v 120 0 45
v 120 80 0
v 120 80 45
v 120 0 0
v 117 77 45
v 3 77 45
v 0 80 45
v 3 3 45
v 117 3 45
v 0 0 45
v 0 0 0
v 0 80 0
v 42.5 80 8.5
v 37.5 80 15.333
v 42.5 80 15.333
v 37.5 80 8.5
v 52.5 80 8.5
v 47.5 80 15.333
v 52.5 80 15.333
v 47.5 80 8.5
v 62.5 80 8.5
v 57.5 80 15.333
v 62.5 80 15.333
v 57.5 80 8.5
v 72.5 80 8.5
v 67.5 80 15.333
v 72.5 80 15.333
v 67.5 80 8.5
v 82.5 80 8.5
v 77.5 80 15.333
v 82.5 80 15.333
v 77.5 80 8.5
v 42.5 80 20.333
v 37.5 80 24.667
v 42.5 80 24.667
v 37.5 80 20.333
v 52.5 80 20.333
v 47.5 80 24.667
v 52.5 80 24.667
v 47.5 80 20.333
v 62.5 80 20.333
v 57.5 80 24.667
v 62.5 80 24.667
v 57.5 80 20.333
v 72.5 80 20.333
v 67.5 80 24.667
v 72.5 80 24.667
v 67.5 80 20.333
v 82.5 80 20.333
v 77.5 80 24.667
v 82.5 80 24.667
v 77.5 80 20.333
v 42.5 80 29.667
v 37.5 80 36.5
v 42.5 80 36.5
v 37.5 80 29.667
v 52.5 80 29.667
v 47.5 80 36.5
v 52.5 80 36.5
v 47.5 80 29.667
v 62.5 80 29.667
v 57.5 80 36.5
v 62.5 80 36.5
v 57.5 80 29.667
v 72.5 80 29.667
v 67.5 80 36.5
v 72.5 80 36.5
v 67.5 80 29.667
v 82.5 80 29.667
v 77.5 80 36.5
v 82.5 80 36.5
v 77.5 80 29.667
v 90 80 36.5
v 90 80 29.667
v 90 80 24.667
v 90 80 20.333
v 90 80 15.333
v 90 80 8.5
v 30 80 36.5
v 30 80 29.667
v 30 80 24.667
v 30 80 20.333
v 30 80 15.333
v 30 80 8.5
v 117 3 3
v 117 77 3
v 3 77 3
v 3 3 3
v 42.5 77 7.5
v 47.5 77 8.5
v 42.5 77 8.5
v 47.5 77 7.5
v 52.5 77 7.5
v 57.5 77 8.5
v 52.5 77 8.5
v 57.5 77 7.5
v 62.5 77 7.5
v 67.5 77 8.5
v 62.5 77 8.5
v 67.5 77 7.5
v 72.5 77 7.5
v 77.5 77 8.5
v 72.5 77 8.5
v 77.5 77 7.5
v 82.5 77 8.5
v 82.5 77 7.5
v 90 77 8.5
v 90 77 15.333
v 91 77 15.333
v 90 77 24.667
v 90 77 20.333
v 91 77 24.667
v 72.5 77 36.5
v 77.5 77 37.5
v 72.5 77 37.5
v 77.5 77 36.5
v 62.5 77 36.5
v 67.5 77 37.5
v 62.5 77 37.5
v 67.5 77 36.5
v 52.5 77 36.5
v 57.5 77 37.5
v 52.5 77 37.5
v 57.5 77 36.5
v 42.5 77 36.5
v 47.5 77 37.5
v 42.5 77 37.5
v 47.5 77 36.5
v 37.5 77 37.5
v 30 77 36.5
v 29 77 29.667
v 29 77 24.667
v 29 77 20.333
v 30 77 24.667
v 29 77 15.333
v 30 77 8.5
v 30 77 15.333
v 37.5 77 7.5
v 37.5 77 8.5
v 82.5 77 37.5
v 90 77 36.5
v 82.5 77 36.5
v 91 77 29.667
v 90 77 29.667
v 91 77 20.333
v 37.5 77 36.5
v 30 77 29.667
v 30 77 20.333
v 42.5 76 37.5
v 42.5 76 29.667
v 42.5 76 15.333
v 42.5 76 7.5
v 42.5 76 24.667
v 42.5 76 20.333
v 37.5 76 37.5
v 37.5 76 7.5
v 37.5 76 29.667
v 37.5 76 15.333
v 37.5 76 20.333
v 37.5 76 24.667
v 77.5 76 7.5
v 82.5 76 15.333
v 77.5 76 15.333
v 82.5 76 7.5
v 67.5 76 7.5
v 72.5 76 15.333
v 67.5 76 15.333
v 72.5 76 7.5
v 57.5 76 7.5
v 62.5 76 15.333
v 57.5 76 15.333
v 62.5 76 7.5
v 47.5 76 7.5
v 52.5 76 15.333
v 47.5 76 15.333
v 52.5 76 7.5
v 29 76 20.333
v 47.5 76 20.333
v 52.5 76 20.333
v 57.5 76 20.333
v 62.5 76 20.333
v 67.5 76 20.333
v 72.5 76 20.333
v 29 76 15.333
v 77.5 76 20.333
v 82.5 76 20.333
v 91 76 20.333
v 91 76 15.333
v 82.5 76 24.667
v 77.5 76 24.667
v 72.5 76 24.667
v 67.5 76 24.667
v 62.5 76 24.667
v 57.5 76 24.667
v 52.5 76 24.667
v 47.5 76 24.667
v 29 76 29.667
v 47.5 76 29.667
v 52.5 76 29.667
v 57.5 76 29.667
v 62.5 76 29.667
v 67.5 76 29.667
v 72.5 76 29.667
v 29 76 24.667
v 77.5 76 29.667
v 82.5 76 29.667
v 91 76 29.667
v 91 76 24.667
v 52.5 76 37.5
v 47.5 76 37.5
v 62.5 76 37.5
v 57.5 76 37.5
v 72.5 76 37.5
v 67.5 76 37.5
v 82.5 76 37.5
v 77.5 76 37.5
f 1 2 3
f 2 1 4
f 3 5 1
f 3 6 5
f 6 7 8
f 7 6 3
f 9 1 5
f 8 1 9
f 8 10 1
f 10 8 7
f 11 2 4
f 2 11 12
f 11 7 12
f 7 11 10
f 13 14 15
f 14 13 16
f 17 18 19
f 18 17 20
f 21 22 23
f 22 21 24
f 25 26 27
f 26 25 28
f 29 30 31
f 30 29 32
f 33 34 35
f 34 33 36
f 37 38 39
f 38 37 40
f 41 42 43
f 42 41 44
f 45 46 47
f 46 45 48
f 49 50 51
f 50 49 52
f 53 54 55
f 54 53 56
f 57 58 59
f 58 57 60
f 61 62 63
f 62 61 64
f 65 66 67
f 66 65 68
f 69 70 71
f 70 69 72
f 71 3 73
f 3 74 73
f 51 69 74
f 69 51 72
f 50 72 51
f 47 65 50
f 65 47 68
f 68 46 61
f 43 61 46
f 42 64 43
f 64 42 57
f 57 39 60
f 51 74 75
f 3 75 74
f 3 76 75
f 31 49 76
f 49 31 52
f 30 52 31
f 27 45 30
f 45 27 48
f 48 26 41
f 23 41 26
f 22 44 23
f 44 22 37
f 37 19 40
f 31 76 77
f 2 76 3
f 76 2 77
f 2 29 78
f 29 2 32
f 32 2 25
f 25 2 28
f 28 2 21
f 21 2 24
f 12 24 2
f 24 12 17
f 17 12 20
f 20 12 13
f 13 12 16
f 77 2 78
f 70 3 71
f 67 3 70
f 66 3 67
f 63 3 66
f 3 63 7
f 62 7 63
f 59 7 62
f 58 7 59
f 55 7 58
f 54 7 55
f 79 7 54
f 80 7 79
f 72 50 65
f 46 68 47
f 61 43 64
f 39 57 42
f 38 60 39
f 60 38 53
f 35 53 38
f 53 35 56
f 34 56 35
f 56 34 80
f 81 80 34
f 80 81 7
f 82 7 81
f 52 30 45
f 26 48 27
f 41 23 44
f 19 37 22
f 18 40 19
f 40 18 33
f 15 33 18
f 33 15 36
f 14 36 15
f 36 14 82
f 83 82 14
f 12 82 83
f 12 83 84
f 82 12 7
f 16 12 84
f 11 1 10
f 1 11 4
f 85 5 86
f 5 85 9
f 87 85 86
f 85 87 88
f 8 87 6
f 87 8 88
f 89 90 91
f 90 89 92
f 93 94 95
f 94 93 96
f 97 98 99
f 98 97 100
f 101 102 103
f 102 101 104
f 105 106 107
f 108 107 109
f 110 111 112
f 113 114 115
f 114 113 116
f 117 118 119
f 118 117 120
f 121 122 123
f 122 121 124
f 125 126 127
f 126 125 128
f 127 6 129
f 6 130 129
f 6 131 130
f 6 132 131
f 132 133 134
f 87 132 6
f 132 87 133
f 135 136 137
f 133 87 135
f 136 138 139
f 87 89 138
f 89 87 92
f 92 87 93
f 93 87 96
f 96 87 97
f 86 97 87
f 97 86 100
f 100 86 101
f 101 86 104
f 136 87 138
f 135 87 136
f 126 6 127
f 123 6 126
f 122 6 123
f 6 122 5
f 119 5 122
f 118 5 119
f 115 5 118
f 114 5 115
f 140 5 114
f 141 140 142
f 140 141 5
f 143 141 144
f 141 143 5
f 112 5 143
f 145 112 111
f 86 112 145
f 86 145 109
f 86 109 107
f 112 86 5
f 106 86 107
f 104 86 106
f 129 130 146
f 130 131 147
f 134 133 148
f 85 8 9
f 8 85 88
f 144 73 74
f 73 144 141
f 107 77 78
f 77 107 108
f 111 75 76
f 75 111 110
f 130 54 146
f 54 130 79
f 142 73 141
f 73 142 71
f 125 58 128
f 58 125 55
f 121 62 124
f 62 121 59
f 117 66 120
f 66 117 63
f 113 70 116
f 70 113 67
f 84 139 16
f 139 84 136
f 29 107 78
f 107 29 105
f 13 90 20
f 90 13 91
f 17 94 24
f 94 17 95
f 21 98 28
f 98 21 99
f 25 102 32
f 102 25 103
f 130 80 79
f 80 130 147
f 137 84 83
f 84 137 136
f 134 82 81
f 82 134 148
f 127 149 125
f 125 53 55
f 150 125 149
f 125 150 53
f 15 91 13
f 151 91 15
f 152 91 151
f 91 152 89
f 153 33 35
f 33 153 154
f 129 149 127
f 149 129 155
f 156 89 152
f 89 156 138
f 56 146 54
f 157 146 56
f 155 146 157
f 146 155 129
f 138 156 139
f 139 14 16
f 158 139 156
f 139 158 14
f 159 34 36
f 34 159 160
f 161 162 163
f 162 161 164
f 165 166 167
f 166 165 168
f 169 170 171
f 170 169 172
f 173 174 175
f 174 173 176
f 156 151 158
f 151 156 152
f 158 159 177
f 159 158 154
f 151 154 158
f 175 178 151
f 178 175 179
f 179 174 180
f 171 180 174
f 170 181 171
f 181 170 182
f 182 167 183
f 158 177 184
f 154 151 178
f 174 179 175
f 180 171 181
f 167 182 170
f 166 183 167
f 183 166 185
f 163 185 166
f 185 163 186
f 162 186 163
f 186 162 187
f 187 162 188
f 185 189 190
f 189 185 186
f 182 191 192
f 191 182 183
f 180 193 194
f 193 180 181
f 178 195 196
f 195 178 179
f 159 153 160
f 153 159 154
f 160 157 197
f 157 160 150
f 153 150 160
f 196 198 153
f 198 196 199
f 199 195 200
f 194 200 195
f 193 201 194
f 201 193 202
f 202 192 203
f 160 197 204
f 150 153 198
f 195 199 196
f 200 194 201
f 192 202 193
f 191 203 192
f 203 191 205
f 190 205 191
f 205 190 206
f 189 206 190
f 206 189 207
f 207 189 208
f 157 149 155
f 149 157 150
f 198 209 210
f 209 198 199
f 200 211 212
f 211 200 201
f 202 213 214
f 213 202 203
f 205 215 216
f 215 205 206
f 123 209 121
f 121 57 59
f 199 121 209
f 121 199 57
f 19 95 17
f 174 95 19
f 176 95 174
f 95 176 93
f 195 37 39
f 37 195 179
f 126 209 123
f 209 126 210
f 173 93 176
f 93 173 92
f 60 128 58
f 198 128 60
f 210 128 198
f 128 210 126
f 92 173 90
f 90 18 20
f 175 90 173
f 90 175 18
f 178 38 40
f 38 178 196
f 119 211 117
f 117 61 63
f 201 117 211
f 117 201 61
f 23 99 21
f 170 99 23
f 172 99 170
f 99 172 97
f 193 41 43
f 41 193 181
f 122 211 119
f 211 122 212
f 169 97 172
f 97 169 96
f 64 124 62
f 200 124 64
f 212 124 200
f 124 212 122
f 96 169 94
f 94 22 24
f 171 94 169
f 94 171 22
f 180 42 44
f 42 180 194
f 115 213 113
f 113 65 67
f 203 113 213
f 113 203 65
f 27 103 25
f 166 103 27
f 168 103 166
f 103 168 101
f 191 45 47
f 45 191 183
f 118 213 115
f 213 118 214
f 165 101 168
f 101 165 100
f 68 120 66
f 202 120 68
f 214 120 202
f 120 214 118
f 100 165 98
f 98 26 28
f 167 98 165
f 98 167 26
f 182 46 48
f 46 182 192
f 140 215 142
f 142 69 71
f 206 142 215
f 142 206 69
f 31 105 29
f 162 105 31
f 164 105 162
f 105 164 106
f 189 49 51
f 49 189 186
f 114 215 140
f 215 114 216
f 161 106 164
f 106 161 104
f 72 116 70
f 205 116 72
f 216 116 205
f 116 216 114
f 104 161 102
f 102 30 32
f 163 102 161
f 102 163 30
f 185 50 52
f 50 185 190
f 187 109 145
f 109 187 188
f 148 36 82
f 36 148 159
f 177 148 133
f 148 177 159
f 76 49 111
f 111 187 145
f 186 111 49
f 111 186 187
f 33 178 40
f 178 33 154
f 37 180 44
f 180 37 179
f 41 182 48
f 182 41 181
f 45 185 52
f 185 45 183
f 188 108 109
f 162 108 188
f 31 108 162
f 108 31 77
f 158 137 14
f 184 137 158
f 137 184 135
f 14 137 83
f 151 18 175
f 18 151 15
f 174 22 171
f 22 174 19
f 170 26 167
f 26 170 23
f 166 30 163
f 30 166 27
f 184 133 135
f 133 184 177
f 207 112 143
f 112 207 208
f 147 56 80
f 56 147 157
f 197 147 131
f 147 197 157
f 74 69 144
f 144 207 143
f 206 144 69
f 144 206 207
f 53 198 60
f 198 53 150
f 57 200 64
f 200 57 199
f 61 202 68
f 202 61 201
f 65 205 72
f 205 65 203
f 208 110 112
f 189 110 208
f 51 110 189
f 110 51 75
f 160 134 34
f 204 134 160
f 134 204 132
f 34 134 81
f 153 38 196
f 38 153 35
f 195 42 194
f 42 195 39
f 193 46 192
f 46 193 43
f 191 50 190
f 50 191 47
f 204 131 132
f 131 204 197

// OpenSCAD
$fn = 32;

// ----------------------------------------------------------------------
// Vent box: crossgrid enclosure
// ----------------------------------------------------------------------

// --- parameters (mm) ---
box_l = 120;              // box length, X
box_w = 80;               // box width, Y
box_h = 45;               // box height, Z
wall_t = 3;               // shell wall thickness
win_l = 60;               // vent window width, X
win_h = 28;               // vent window height, Z
bar_w = 5;                // grid bar width
n_v = 5;                  // vertical bar count
n_h = 2;                  // horizontal bar count

win_z0 = (box_h - win_h) / 2;  // window lower edge Z
v_step = win_l / (n_v + 1);  // vertical bar step
h_step = win_h / (n_h + 1);  // horizontal bar step

difference() {
  union() {
    difference() {
      cube([box_l, box_w, box_h]);
  translate([wall_t, wall_t, wall_t])
    cube([box_l - 2 * wall_t, box_w - 2 * wall_t, box_h]);
  translate([(box_l - win_l) / 2, box_w - wall_t - 1, win_z0])
    cube([win_l, wall_t + 2, win_h]);
    }
    for (i = [1 : n_v])
      translate([(box_l - win_l) / 2 + i * v_step - bar_w / 2,
                 box_w - wall_t - 1, win_z0 - 1])
        cube([bar_w, wall_t + 1, win_h + 2]);
    for (i = [1 : n_h])
      translate([(box_l - win_l) / 2 - 1, box_w - wall_t - 1,
                 win_z0 + i * h_step - bar_w / 2])
        cube([win_l + 2, wall_t + 1, bar_w]);
  }
}
